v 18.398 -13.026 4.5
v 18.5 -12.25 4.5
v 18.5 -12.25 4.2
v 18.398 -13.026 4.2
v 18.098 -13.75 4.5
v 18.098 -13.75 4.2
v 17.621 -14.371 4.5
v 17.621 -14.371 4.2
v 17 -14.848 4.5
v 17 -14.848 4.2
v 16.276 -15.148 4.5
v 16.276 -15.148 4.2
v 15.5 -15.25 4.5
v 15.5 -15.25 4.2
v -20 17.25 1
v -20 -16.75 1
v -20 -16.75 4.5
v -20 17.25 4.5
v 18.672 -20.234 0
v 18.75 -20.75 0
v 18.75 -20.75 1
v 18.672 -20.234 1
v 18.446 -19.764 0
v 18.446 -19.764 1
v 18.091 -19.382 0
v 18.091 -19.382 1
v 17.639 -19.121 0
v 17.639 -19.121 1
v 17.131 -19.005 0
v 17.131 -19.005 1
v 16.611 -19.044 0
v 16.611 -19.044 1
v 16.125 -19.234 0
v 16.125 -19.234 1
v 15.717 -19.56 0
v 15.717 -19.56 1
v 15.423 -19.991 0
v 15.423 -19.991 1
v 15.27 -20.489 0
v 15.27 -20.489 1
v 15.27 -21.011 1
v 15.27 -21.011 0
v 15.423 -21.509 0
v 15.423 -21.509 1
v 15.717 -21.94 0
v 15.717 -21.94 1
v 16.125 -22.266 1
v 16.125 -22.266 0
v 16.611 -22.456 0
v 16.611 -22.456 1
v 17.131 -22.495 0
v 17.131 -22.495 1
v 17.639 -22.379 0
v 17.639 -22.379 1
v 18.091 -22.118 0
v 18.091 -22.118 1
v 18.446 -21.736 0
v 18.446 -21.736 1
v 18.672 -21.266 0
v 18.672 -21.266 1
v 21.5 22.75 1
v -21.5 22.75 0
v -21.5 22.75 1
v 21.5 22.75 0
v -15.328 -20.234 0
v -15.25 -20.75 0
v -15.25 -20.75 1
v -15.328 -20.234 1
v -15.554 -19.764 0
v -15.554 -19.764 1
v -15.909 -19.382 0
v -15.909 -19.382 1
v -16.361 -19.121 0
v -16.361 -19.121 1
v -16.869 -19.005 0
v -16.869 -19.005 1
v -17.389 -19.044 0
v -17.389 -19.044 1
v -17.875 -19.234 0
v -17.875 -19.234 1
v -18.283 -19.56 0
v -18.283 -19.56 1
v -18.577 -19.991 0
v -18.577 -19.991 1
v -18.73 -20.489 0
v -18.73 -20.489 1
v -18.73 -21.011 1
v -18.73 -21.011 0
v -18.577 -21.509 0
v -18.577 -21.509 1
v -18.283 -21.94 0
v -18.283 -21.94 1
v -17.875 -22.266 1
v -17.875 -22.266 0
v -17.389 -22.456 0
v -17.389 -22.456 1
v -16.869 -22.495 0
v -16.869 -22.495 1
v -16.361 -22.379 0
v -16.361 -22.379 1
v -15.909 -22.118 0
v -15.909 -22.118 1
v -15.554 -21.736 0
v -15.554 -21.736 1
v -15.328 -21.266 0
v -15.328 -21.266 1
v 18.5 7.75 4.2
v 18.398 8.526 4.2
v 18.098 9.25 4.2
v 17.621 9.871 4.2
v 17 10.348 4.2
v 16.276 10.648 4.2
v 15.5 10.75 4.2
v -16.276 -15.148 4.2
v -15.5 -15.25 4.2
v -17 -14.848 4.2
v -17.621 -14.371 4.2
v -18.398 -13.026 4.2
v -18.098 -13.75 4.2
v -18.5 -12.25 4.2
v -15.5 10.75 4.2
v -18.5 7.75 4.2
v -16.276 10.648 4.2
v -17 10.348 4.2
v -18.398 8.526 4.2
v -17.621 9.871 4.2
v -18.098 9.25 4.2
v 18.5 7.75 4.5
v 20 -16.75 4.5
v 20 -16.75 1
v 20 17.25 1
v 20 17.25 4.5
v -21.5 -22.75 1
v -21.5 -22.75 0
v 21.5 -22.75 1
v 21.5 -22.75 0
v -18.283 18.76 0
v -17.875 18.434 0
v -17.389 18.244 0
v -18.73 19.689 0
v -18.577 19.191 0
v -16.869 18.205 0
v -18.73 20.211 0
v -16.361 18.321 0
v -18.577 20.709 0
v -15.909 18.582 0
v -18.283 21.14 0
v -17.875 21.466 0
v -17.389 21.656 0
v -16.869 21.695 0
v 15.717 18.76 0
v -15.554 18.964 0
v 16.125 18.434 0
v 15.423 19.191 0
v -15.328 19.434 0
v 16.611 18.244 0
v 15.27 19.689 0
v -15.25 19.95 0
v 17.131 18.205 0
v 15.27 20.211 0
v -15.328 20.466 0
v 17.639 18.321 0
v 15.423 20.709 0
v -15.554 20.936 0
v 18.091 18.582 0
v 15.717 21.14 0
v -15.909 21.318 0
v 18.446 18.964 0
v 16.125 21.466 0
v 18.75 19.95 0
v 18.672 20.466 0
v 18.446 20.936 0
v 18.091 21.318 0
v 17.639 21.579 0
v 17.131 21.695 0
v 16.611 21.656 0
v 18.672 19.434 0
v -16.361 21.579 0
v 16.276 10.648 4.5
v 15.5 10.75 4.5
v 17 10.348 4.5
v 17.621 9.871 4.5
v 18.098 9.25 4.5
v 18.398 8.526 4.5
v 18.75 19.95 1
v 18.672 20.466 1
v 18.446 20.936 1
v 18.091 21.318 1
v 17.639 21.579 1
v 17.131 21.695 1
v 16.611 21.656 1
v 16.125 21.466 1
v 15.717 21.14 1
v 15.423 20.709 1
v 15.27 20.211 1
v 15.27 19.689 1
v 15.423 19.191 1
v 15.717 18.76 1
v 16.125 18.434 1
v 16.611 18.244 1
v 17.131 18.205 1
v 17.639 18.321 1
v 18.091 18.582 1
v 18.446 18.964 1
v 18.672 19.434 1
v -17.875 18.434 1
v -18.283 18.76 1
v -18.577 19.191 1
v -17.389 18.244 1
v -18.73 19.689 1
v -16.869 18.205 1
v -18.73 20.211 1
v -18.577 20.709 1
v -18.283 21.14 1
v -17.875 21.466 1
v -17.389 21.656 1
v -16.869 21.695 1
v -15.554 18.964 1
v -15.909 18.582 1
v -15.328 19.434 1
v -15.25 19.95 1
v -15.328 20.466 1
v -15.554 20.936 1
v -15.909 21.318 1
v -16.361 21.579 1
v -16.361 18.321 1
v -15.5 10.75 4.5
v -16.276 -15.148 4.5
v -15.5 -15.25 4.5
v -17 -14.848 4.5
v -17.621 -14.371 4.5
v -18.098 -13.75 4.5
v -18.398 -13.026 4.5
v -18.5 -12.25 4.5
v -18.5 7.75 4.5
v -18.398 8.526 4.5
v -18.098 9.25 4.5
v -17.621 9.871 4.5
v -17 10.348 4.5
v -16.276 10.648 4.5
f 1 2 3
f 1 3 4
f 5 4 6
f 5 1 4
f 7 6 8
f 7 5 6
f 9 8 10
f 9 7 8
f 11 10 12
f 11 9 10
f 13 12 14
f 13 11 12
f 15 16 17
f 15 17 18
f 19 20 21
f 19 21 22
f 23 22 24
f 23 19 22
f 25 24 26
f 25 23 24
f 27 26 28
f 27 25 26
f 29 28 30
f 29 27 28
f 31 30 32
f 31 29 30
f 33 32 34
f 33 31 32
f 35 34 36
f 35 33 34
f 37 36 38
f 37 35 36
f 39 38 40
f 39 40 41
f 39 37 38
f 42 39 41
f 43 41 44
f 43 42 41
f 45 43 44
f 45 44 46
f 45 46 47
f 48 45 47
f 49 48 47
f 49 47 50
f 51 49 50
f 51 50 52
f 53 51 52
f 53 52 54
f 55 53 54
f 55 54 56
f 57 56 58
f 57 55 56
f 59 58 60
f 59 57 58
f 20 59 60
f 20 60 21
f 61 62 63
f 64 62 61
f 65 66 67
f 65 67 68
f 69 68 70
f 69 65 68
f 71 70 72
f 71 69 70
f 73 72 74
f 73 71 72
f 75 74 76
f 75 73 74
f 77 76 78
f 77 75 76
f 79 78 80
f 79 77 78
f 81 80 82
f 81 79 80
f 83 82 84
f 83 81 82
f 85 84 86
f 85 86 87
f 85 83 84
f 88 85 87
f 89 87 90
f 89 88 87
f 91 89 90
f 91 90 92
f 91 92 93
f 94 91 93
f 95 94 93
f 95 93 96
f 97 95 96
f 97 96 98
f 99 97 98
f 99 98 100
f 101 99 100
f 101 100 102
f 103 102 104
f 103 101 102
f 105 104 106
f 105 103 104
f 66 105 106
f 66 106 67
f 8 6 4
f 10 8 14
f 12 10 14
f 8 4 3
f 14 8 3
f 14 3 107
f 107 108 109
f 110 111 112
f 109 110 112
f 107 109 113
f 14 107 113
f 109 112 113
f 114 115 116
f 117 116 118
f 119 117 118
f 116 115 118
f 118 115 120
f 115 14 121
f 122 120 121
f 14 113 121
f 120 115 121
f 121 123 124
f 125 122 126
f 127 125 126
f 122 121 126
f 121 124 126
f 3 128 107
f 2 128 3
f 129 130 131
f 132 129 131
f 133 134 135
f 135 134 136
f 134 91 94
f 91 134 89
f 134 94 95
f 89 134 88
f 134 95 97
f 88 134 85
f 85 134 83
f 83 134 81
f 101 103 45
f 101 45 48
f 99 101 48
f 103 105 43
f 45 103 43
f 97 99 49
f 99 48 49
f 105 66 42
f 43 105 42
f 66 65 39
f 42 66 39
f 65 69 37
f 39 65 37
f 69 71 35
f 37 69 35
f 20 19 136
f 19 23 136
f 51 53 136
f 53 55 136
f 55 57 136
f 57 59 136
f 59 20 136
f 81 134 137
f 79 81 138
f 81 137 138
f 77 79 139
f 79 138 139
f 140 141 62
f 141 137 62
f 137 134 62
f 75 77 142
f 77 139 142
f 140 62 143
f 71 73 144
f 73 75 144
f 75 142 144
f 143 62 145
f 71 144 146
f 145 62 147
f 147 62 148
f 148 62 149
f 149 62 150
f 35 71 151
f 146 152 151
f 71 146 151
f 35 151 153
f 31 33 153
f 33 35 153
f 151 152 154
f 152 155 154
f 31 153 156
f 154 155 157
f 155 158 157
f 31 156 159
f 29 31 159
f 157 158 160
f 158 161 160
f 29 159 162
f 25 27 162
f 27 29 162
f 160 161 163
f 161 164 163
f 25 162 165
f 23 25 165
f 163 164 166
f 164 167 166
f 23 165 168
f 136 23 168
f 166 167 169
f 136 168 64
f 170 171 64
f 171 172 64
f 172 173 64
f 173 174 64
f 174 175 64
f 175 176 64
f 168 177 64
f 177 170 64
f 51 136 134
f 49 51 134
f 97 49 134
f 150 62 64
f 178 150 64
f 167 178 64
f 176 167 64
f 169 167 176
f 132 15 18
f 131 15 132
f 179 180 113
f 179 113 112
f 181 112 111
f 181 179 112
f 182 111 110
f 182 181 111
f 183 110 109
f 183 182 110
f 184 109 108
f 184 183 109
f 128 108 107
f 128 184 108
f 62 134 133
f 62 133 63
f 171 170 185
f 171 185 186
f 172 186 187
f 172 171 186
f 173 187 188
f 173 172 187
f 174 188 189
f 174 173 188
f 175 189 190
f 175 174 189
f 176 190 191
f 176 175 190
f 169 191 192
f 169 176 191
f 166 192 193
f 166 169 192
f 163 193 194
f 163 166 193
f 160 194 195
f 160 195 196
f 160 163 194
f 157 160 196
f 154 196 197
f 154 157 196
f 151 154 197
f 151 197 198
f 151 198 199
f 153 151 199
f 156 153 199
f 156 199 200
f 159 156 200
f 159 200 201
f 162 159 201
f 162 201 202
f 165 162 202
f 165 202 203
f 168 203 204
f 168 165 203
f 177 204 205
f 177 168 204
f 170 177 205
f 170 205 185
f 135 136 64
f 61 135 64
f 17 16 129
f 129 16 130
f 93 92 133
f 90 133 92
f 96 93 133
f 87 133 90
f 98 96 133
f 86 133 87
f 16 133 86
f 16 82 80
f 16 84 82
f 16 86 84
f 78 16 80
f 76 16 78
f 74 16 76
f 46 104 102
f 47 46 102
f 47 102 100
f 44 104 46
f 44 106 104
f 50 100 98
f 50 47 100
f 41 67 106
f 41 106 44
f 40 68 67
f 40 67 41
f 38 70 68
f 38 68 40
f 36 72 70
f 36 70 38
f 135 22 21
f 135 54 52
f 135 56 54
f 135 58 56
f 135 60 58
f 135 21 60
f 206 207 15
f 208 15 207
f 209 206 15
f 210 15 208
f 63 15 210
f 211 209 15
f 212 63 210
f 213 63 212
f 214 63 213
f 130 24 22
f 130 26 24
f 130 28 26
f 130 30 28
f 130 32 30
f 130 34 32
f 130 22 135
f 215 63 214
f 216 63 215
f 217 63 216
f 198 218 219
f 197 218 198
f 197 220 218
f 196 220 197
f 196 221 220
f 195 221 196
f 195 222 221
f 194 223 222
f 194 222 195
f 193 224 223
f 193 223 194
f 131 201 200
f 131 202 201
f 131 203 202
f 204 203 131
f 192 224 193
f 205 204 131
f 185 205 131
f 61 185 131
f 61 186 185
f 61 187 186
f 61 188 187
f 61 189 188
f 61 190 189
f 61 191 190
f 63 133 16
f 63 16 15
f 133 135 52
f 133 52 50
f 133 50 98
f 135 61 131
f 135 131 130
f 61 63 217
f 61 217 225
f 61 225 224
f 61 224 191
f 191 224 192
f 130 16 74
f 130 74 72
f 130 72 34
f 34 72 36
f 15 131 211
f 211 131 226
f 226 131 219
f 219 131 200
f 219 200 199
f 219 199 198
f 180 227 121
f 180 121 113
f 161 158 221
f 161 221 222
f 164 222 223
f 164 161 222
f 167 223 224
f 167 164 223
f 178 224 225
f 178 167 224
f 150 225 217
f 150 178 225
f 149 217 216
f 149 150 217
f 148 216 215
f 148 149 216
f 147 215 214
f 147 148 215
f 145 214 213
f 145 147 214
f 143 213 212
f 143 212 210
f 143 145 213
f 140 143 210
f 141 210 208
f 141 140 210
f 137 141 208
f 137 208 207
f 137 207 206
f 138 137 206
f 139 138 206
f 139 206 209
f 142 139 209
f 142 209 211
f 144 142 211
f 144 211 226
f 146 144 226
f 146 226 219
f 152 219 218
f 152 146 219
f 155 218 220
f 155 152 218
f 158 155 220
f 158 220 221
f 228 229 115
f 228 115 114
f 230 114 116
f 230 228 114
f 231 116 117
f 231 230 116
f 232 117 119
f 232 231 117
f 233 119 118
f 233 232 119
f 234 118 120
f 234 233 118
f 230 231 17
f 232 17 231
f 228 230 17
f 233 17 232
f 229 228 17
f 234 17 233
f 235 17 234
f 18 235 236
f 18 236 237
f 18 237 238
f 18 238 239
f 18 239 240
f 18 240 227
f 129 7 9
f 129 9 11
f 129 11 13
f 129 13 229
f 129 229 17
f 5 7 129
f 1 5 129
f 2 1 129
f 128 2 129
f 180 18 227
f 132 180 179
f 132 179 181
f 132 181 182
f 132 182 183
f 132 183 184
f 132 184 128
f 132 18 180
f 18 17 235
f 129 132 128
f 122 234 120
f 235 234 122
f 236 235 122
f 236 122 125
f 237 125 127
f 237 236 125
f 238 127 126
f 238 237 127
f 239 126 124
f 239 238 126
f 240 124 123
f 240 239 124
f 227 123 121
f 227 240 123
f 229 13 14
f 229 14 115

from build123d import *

# Parameters (mm, degrees)
SKETCH1_W           = 43
SKETCH1_H           = 45.5
SKETCH1_R           = 1.75
BOSS_EXTRUDE1_DEPTH = 1
SKETCH2_W           = 40
SKETCH2_H           = 34
BOSS_EXTRUDE2_DEPTH = 3.5
CUT_EXTRUDE1_DEPTH  = 0.3


with BuildPart() as part:
    # Sketch1 → Boss-Extrude1 (new body)
    with BuildSketch(Plane.XY):
        Rectangle(SKETCH1_W, SKETCH1_H)
        with Locations((-17, 19.95)):
            Circle(SKETCH1_R, mode=Mode.SUBTRACT)
        with Locations((17, 19.95)):
            Circle(SKETCH1_R, mode=Mode.SUBTRACT)
        with Locations((-17, -20.75)):
            Circle(SKETCH1_R, mode=Mode.SUBTRACT)
        with Locations((17, -20.75)):
            Circle(SKETCH1_R, mode=Mode.SUBTRACT)
    extrude(amount=BOSS_EXTRUDE1_DEPTH)

    # Sketch2 → Boss-Extrude2 (add)
    with BuildSketch(Plane.XY.offset(1)):
        with Locations((0, 0.25)):
            Rectangle(SKETCH2_W, SKETCH2_H)
    extrude(amount=BOSS_EXTRUDE2_DEPTH)

    # Sketch3 → Cut-Extrude1 (cut)
    with BuildSketch(Plane.XY.offset(4.5)):
        with BuildLine():
            Line((-15.5, 10.75), (15.5, 10.75))
            ThreePointArc((15.5, 10.75), (17.621320344, 9.871320344), (18.5, 7.75))
            Line((18.5, 7.75), (18.5, -12.25))
            ThreePointArc((18.5, -12.25), (17.621320344, -14.371320344), (15.5, -15.25))
            Line((15.5, -15.25), (-15.5, -15.25))
            ThreePointArc((-15.5, -15.25), (-17.621320344, -14.371320344), (-18.5, -12.25))
            Line((-18.5, -12.25), (-18.5, 7.75))
            ThreePointArc((-18.5, 7.75), (-17.621320344, 9.871320344), (-15.5, 10.75))
        make_face()
    extrude(amount=-CUT_EXTRUDE1_DEPTH, mode=Mode.SUBTRACT)


solid = part.part
